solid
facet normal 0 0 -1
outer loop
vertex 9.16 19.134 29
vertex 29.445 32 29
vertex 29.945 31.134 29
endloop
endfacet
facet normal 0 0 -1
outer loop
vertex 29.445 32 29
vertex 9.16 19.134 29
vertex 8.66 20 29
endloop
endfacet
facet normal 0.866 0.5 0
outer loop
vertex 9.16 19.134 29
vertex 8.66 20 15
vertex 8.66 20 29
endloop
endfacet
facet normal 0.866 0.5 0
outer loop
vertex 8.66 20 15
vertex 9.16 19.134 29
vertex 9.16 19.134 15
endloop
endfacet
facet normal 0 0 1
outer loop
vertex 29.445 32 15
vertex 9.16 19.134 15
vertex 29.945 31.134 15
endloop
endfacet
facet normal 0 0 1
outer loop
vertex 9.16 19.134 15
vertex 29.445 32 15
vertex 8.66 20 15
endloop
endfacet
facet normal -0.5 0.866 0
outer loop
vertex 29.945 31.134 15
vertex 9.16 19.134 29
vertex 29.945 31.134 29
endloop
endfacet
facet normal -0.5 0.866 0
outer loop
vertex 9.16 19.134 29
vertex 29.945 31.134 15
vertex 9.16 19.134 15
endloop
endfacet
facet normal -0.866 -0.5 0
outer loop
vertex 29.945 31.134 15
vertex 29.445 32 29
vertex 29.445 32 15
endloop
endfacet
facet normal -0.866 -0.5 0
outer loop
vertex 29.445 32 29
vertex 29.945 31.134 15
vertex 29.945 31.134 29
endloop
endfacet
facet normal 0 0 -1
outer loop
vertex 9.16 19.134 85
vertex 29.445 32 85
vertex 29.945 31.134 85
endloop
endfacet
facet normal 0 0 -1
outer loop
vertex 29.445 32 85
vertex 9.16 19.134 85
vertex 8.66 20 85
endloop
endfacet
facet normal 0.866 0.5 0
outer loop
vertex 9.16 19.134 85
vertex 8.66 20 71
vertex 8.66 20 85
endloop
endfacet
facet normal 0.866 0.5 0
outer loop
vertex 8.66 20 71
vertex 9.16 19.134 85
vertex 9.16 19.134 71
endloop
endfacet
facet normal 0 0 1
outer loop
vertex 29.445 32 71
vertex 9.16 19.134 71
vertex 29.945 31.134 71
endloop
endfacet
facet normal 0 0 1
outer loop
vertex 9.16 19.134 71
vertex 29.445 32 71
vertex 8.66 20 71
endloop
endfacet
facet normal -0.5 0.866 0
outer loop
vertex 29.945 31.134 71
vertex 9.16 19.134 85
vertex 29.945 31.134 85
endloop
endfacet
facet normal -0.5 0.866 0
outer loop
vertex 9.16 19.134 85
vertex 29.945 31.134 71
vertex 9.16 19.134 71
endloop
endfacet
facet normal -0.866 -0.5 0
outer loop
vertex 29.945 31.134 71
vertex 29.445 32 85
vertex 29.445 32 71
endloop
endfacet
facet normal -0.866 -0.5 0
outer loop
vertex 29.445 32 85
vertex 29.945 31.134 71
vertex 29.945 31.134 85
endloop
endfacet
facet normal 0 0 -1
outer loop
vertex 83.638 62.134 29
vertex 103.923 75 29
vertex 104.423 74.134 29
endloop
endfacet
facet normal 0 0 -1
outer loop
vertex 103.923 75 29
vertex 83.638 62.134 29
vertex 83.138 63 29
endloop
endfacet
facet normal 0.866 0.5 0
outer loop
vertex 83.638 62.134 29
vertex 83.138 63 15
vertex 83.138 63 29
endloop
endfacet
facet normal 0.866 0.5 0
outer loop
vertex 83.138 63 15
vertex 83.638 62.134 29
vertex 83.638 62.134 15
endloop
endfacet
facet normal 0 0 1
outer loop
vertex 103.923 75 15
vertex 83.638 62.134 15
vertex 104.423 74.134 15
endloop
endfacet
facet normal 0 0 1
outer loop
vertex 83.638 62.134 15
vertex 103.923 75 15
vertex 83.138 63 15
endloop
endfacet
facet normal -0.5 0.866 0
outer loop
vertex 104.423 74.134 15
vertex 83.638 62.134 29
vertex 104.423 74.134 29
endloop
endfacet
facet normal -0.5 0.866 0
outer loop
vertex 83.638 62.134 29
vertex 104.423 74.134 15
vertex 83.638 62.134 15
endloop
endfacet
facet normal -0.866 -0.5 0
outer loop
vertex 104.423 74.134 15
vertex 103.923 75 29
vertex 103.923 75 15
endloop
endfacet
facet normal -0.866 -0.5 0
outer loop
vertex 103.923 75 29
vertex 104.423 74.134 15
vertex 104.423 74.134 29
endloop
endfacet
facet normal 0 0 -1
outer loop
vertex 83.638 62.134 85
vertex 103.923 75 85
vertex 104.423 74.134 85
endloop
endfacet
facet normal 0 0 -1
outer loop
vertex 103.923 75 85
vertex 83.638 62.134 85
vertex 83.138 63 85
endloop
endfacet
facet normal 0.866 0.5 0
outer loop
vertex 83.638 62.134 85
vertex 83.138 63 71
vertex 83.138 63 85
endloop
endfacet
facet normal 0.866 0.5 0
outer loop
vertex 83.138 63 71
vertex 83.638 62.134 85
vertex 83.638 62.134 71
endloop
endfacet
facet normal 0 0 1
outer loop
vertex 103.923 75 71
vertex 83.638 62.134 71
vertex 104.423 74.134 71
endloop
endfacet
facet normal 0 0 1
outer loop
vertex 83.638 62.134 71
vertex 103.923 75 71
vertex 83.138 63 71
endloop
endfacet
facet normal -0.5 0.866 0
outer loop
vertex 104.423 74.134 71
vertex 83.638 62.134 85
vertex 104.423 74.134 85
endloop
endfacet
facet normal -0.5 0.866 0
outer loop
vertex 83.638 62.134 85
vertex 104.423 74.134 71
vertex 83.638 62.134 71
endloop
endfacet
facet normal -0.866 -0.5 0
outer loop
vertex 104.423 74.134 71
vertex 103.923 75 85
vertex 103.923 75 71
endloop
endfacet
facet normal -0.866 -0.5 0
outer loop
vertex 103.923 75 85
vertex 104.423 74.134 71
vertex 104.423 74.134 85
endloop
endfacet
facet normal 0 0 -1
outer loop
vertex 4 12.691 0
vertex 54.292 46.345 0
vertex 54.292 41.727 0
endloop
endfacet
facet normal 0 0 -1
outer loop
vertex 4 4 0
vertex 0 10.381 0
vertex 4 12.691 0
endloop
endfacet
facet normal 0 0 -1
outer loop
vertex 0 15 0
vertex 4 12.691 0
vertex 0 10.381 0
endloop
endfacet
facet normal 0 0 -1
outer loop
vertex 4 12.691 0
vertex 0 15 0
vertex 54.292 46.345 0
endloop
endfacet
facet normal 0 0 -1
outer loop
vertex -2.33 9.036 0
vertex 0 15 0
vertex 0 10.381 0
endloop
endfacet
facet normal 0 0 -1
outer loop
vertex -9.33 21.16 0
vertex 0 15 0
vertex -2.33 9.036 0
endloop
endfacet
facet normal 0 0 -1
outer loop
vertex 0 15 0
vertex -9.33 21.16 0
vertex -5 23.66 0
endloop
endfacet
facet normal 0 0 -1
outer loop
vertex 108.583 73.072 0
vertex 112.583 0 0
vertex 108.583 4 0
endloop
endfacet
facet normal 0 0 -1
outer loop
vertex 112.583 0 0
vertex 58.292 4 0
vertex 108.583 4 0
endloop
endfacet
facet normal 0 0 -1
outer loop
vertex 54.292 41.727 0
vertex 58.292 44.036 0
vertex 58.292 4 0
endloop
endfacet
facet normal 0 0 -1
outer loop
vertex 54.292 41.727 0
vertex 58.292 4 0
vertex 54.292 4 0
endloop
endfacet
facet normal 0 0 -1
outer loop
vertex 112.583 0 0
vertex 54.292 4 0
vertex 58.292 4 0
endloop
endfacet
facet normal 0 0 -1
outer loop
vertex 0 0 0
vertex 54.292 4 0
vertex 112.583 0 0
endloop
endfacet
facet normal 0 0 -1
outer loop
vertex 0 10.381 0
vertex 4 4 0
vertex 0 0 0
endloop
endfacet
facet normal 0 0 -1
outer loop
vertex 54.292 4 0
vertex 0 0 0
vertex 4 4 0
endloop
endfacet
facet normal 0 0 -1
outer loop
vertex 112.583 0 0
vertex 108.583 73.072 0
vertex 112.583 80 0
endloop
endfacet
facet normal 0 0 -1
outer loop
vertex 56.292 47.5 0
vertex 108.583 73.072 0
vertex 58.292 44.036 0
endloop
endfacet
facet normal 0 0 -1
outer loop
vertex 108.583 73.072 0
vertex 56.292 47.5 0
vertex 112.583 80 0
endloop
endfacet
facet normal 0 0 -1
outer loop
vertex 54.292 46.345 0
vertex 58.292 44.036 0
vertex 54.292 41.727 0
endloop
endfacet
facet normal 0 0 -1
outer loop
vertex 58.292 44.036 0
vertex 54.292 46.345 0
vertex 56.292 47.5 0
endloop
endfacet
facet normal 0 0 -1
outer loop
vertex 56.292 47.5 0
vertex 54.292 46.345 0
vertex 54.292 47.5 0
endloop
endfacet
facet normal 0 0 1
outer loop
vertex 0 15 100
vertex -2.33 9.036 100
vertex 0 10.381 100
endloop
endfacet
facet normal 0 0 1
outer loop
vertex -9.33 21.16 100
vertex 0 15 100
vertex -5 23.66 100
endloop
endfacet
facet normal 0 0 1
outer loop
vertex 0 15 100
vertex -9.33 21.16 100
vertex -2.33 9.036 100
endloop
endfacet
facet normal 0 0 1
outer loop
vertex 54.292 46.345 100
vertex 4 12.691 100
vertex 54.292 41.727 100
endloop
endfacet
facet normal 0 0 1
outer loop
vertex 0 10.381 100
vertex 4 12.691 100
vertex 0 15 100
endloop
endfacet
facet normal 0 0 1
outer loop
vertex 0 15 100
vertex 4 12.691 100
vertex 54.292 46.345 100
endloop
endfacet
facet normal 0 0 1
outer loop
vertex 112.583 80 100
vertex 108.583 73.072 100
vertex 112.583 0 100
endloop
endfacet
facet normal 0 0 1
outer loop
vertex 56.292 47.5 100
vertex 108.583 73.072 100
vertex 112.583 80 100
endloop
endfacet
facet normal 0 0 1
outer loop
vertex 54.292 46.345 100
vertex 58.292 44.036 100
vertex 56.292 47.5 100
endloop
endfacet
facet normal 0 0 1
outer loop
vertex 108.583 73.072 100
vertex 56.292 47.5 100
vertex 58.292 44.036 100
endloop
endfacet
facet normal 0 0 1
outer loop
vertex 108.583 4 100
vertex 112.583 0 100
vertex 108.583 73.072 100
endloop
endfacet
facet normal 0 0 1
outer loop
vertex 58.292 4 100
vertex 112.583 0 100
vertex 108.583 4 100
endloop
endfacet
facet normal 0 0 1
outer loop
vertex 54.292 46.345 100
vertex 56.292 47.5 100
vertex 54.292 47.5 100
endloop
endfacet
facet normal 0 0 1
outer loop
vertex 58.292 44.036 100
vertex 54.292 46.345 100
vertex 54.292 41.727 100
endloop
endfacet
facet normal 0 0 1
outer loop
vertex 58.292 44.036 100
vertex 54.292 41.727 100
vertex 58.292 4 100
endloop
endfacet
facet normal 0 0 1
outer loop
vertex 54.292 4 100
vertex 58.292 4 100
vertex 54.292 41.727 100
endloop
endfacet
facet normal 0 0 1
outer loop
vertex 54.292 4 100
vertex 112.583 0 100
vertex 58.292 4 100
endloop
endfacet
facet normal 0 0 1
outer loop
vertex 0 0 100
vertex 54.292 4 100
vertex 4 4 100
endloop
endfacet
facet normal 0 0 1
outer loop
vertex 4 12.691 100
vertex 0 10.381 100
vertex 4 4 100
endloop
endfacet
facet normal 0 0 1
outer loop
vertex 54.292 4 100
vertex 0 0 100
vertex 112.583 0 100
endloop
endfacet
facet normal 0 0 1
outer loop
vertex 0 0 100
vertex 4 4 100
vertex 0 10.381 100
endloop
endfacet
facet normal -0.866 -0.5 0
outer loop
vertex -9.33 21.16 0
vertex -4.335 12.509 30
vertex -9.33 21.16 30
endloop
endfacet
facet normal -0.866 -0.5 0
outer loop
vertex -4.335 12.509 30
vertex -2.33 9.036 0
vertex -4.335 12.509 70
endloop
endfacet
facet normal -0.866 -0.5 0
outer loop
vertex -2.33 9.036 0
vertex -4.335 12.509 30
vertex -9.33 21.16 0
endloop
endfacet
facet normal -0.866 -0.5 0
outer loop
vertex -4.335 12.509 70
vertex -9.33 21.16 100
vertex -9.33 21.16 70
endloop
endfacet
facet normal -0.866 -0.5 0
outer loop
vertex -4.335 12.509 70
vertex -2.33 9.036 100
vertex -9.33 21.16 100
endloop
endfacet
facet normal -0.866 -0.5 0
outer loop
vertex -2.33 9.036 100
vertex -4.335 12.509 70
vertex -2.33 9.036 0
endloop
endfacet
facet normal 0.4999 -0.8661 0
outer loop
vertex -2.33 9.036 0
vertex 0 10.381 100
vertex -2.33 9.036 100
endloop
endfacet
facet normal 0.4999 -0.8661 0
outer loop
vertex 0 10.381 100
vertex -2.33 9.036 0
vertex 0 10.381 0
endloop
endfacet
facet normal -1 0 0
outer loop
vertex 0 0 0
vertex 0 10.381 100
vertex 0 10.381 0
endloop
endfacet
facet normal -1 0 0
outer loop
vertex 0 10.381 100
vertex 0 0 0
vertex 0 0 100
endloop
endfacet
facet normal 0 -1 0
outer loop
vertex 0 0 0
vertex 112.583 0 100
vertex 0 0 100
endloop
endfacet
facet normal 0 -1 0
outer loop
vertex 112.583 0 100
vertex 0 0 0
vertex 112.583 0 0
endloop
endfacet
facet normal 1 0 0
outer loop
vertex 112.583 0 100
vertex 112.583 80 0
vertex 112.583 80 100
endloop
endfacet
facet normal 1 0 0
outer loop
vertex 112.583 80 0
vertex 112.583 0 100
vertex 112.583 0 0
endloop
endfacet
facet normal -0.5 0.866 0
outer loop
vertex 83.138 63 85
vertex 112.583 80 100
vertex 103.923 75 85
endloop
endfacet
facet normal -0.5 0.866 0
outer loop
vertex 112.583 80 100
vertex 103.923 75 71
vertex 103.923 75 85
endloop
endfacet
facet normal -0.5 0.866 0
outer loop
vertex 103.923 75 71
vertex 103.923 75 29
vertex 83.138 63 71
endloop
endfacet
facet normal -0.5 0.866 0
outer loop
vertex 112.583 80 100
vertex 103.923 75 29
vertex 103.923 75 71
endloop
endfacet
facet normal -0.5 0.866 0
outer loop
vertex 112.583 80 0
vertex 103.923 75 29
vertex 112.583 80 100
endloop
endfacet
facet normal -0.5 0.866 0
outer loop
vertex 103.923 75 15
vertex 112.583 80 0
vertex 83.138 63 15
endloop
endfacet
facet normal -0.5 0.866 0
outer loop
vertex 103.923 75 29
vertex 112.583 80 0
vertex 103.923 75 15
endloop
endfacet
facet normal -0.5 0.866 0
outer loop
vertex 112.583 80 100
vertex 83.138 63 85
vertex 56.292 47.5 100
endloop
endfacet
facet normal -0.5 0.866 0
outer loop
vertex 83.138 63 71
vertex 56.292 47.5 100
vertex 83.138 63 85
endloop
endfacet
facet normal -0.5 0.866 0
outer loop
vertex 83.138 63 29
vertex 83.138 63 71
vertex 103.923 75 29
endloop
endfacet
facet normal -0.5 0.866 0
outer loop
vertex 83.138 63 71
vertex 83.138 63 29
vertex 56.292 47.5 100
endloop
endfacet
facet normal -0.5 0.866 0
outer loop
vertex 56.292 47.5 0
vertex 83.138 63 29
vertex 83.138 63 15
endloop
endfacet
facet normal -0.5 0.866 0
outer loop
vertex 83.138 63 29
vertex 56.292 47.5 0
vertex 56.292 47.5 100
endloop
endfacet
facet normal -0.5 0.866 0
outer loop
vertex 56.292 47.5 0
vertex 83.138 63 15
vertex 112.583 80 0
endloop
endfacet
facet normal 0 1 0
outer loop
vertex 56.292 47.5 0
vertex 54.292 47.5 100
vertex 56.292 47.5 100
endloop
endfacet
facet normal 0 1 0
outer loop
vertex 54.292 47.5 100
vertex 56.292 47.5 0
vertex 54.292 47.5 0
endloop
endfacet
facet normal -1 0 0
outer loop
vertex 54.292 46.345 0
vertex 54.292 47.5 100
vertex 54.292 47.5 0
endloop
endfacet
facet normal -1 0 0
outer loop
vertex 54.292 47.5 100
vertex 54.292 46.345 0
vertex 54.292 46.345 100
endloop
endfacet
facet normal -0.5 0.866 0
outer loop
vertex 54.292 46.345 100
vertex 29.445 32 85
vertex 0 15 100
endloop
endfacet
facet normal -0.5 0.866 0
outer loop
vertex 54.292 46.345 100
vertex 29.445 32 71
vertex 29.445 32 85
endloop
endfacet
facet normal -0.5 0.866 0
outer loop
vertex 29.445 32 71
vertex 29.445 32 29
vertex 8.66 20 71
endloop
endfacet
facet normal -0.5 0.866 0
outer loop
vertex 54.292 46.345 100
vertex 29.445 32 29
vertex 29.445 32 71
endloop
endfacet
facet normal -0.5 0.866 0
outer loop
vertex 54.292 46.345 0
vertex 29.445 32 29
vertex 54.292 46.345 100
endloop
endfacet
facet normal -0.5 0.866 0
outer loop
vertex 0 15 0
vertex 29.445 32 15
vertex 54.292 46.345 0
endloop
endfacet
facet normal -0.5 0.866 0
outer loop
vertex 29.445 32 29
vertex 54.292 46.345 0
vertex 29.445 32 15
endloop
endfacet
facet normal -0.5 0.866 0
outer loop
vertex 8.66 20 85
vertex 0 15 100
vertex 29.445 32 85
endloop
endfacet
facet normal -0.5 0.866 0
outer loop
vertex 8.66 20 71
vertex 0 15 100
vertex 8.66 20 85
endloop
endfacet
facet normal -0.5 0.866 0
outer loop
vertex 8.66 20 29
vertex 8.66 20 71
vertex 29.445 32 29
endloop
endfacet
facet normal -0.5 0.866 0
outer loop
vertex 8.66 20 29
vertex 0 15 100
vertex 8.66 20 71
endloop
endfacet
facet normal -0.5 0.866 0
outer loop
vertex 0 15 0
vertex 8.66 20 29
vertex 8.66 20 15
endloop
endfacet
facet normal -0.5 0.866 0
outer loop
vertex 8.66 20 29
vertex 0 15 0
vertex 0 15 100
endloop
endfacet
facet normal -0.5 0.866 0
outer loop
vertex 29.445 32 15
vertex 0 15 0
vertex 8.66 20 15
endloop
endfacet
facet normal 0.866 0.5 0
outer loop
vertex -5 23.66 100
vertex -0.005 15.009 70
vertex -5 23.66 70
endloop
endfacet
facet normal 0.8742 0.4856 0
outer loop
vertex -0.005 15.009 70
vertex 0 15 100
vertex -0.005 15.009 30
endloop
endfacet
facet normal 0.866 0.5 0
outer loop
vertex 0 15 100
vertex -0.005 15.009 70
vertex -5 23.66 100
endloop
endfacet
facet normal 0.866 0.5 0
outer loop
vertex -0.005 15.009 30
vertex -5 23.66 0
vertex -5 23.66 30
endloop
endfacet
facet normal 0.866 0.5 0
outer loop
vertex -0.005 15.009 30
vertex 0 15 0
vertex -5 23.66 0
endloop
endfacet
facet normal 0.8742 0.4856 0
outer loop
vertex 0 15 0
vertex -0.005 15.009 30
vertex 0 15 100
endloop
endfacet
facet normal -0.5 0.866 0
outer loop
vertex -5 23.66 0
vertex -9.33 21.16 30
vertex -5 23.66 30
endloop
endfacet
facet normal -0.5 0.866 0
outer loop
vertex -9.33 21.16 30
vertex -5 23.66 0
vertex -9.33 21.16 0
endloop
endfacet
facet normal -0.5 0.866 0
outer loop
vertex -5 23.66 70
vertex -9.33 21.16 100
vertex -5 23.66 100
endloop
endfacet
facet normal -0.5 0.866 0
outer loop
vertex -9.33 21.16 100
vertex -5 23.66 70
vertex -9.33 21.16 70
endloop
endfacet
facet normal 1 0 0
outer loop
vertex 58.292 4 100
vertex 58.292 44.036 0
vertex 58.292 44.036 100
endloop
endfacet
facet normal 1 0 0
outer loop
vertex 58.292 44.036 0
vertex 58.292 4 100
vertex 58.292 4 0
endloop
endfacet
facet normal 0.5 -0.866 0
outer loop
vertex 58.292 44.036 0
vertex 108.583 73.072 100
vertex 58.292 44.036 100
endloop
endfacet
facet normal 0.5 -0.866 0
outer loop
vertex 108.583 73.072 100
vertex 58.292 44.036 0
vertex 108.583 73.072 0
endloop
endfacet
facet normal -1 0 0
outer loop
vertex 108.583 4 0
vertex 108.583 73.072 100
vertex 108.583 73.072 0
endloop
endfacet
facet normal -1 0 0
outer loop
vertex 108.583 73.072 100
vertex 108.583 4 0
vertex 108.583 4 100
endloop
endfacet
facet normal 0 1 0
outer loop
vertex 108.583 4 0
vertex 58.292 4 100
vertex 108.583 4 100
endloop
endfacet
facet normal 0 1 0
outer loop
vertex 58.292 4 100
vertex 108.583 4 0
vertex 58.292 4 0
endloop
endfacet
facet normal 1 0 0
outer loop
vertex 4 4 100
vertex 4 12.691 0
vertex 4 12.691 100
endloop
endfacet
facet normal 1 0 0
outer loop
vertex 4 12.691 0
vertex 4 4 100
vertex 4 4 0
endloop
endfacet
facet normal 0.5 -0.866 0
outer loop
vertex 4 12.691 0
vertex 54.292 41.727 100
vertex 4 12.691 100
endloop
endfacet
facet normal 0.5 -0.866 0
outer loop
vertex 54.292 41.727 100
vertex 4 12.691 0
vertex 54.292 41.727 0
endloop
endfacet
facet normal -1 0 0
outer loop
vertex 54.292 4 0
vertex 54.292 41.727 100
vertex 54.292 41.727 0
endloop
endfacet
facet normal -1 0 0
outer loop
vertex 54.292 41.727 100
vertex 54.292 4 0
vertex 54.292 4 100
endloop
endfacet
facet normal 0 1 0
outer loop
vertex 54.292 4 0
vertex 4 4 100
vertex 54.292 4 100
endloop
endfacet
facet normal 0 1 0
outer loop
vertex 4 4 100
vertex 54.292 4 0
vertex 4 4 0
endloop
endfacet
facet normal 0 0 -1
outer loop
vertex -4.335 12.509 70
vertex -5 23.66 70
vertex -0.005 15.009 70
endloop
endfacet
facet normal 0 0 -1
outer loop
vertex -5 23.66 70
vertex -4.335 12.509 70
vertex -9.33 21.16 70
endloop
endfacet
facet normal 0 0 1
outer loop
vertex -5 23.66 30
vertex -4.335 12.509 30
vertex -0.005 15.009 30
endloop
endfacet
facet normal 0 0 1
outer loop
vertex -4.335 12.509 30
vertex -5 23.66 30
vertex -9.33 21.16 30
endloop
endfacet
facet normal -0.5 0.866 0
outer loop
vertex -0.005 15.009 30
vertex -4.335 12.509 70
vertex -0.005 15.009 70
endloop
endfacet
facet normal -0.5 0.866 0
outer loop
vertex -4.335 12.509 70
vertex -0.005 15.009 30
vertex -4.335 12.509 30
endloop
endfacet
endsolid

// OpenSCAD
// StarLocator phone mount — parametric OpenSCAD source
// -----------------------------------------------------------------------------
// The phone lies SCREEN-DOWN on a ramp with its bottom edge against the lip, so the
// back camera looks along the ramp's surface normal:
//     camera elevation = 90° - ramp angle      (60° elevation -> 30° ramp)
// The exact angle is not critical: the app's one-time calibration absorbs it. What
// matters is that the phone sits the SAME way every time (same case, fully seated).
//
// The model is generated in its PRINT orientation: lying on its side, the triangular
// profile flat on the bed, so it prints without supports. Units: mm.
// -----------------------------------------------------------------------------

camera_elevation = 60;    // degrees above the horizon the back camera points at
deck_length      = 130;   // ramp length along the slope (phone overhangs past it: camera end stays free)
width            = 100;   // across the ramp; wider than any phone + case
front_height     = 15;    // keeps the phone's bottom edge / speaker off the ground
wall             = 4;     // wall / deck thickness
lip_height       = 10;    // stop for the phone's bottom edge, measured from the deck surface
lip_thickness    = 5;
speaker_slot     = 40;    // gap in the middle of the lip for the bottom speaker / USB port
pad_depth        = 1.0;   // recesses for adhesive felt/rubber pads that protect the screen
pad_len          = 24;    // pad size along the slope
pad_wid          = 14;    // pad size across

ramp = 90 - camera_elevation;          // ramp angle from horizontal
L    = deck_length * cos(ramp);        // horizontal footprint of the ramp
H    = front_height + deck_length * sin(ramp);
P0   = [0, front_height];              // front edge of the deck surface (2D: x = along slope, y = height)

// 2D side profile (x = horizontal, y = up in use)
module outer() { polygon([[0, 0], [L, 0], [L, H], P0]); }

module profile() {
    union() {
        difference() {               // hollow triangular frame: base, back, deck
            outer();
            offset(delta = -wall) outer();
        }
        // vertical brace in the middle
        translate([L / 2 - wall / 2, 0]) square([wall, front_height + (L / 2) * tan(ramp)]);
        // lip, perpendicular to the deck, just in front of the deck's front edge
        translate(P0) rotate(ramp) translate([-lip_thickness, 0]) square([lip_thickness, lip_height]);
        // fill under the lip so it is supported down to the frame
        translate(P0) rotate(ramp) translate([-lip_thickness, -wall]) square([lip_thickness, wall]);
    }
}

// In deck-local coordinates: x along the slope from the front edge, y along the outward normal.
module deck_local() { translate(P0) rotate([0, 0, ramp]) children(); }

difference() {
    linear_extrude(height = width) profile();

    // speaker / USB slot through the lip (only above the deck surface)
    deck_local() translate([-lip_thickness - 1, 0.01, width / 2 - speaker_slot / 2])
        cube([lip_thickness + 1.01, lip_height + 1, speaker_slot]);

    // four shallow pad recesses on the deck surface
    for (s = [22, deck_length - 22], z = [22, width - 22])
        deck_local() translate([s - pad_len / 2, -pad_depth, z - pad_wid / 2])
            cube([pad_len, pad_depth + 1, pad_wid]);
}

echo(str("ramp angle = ", ramp, " deg, camera elevation = ", camera_elevation,
         " deg, footprint = ", L, " x ", width, " mm, height = ", H, " mm"));
